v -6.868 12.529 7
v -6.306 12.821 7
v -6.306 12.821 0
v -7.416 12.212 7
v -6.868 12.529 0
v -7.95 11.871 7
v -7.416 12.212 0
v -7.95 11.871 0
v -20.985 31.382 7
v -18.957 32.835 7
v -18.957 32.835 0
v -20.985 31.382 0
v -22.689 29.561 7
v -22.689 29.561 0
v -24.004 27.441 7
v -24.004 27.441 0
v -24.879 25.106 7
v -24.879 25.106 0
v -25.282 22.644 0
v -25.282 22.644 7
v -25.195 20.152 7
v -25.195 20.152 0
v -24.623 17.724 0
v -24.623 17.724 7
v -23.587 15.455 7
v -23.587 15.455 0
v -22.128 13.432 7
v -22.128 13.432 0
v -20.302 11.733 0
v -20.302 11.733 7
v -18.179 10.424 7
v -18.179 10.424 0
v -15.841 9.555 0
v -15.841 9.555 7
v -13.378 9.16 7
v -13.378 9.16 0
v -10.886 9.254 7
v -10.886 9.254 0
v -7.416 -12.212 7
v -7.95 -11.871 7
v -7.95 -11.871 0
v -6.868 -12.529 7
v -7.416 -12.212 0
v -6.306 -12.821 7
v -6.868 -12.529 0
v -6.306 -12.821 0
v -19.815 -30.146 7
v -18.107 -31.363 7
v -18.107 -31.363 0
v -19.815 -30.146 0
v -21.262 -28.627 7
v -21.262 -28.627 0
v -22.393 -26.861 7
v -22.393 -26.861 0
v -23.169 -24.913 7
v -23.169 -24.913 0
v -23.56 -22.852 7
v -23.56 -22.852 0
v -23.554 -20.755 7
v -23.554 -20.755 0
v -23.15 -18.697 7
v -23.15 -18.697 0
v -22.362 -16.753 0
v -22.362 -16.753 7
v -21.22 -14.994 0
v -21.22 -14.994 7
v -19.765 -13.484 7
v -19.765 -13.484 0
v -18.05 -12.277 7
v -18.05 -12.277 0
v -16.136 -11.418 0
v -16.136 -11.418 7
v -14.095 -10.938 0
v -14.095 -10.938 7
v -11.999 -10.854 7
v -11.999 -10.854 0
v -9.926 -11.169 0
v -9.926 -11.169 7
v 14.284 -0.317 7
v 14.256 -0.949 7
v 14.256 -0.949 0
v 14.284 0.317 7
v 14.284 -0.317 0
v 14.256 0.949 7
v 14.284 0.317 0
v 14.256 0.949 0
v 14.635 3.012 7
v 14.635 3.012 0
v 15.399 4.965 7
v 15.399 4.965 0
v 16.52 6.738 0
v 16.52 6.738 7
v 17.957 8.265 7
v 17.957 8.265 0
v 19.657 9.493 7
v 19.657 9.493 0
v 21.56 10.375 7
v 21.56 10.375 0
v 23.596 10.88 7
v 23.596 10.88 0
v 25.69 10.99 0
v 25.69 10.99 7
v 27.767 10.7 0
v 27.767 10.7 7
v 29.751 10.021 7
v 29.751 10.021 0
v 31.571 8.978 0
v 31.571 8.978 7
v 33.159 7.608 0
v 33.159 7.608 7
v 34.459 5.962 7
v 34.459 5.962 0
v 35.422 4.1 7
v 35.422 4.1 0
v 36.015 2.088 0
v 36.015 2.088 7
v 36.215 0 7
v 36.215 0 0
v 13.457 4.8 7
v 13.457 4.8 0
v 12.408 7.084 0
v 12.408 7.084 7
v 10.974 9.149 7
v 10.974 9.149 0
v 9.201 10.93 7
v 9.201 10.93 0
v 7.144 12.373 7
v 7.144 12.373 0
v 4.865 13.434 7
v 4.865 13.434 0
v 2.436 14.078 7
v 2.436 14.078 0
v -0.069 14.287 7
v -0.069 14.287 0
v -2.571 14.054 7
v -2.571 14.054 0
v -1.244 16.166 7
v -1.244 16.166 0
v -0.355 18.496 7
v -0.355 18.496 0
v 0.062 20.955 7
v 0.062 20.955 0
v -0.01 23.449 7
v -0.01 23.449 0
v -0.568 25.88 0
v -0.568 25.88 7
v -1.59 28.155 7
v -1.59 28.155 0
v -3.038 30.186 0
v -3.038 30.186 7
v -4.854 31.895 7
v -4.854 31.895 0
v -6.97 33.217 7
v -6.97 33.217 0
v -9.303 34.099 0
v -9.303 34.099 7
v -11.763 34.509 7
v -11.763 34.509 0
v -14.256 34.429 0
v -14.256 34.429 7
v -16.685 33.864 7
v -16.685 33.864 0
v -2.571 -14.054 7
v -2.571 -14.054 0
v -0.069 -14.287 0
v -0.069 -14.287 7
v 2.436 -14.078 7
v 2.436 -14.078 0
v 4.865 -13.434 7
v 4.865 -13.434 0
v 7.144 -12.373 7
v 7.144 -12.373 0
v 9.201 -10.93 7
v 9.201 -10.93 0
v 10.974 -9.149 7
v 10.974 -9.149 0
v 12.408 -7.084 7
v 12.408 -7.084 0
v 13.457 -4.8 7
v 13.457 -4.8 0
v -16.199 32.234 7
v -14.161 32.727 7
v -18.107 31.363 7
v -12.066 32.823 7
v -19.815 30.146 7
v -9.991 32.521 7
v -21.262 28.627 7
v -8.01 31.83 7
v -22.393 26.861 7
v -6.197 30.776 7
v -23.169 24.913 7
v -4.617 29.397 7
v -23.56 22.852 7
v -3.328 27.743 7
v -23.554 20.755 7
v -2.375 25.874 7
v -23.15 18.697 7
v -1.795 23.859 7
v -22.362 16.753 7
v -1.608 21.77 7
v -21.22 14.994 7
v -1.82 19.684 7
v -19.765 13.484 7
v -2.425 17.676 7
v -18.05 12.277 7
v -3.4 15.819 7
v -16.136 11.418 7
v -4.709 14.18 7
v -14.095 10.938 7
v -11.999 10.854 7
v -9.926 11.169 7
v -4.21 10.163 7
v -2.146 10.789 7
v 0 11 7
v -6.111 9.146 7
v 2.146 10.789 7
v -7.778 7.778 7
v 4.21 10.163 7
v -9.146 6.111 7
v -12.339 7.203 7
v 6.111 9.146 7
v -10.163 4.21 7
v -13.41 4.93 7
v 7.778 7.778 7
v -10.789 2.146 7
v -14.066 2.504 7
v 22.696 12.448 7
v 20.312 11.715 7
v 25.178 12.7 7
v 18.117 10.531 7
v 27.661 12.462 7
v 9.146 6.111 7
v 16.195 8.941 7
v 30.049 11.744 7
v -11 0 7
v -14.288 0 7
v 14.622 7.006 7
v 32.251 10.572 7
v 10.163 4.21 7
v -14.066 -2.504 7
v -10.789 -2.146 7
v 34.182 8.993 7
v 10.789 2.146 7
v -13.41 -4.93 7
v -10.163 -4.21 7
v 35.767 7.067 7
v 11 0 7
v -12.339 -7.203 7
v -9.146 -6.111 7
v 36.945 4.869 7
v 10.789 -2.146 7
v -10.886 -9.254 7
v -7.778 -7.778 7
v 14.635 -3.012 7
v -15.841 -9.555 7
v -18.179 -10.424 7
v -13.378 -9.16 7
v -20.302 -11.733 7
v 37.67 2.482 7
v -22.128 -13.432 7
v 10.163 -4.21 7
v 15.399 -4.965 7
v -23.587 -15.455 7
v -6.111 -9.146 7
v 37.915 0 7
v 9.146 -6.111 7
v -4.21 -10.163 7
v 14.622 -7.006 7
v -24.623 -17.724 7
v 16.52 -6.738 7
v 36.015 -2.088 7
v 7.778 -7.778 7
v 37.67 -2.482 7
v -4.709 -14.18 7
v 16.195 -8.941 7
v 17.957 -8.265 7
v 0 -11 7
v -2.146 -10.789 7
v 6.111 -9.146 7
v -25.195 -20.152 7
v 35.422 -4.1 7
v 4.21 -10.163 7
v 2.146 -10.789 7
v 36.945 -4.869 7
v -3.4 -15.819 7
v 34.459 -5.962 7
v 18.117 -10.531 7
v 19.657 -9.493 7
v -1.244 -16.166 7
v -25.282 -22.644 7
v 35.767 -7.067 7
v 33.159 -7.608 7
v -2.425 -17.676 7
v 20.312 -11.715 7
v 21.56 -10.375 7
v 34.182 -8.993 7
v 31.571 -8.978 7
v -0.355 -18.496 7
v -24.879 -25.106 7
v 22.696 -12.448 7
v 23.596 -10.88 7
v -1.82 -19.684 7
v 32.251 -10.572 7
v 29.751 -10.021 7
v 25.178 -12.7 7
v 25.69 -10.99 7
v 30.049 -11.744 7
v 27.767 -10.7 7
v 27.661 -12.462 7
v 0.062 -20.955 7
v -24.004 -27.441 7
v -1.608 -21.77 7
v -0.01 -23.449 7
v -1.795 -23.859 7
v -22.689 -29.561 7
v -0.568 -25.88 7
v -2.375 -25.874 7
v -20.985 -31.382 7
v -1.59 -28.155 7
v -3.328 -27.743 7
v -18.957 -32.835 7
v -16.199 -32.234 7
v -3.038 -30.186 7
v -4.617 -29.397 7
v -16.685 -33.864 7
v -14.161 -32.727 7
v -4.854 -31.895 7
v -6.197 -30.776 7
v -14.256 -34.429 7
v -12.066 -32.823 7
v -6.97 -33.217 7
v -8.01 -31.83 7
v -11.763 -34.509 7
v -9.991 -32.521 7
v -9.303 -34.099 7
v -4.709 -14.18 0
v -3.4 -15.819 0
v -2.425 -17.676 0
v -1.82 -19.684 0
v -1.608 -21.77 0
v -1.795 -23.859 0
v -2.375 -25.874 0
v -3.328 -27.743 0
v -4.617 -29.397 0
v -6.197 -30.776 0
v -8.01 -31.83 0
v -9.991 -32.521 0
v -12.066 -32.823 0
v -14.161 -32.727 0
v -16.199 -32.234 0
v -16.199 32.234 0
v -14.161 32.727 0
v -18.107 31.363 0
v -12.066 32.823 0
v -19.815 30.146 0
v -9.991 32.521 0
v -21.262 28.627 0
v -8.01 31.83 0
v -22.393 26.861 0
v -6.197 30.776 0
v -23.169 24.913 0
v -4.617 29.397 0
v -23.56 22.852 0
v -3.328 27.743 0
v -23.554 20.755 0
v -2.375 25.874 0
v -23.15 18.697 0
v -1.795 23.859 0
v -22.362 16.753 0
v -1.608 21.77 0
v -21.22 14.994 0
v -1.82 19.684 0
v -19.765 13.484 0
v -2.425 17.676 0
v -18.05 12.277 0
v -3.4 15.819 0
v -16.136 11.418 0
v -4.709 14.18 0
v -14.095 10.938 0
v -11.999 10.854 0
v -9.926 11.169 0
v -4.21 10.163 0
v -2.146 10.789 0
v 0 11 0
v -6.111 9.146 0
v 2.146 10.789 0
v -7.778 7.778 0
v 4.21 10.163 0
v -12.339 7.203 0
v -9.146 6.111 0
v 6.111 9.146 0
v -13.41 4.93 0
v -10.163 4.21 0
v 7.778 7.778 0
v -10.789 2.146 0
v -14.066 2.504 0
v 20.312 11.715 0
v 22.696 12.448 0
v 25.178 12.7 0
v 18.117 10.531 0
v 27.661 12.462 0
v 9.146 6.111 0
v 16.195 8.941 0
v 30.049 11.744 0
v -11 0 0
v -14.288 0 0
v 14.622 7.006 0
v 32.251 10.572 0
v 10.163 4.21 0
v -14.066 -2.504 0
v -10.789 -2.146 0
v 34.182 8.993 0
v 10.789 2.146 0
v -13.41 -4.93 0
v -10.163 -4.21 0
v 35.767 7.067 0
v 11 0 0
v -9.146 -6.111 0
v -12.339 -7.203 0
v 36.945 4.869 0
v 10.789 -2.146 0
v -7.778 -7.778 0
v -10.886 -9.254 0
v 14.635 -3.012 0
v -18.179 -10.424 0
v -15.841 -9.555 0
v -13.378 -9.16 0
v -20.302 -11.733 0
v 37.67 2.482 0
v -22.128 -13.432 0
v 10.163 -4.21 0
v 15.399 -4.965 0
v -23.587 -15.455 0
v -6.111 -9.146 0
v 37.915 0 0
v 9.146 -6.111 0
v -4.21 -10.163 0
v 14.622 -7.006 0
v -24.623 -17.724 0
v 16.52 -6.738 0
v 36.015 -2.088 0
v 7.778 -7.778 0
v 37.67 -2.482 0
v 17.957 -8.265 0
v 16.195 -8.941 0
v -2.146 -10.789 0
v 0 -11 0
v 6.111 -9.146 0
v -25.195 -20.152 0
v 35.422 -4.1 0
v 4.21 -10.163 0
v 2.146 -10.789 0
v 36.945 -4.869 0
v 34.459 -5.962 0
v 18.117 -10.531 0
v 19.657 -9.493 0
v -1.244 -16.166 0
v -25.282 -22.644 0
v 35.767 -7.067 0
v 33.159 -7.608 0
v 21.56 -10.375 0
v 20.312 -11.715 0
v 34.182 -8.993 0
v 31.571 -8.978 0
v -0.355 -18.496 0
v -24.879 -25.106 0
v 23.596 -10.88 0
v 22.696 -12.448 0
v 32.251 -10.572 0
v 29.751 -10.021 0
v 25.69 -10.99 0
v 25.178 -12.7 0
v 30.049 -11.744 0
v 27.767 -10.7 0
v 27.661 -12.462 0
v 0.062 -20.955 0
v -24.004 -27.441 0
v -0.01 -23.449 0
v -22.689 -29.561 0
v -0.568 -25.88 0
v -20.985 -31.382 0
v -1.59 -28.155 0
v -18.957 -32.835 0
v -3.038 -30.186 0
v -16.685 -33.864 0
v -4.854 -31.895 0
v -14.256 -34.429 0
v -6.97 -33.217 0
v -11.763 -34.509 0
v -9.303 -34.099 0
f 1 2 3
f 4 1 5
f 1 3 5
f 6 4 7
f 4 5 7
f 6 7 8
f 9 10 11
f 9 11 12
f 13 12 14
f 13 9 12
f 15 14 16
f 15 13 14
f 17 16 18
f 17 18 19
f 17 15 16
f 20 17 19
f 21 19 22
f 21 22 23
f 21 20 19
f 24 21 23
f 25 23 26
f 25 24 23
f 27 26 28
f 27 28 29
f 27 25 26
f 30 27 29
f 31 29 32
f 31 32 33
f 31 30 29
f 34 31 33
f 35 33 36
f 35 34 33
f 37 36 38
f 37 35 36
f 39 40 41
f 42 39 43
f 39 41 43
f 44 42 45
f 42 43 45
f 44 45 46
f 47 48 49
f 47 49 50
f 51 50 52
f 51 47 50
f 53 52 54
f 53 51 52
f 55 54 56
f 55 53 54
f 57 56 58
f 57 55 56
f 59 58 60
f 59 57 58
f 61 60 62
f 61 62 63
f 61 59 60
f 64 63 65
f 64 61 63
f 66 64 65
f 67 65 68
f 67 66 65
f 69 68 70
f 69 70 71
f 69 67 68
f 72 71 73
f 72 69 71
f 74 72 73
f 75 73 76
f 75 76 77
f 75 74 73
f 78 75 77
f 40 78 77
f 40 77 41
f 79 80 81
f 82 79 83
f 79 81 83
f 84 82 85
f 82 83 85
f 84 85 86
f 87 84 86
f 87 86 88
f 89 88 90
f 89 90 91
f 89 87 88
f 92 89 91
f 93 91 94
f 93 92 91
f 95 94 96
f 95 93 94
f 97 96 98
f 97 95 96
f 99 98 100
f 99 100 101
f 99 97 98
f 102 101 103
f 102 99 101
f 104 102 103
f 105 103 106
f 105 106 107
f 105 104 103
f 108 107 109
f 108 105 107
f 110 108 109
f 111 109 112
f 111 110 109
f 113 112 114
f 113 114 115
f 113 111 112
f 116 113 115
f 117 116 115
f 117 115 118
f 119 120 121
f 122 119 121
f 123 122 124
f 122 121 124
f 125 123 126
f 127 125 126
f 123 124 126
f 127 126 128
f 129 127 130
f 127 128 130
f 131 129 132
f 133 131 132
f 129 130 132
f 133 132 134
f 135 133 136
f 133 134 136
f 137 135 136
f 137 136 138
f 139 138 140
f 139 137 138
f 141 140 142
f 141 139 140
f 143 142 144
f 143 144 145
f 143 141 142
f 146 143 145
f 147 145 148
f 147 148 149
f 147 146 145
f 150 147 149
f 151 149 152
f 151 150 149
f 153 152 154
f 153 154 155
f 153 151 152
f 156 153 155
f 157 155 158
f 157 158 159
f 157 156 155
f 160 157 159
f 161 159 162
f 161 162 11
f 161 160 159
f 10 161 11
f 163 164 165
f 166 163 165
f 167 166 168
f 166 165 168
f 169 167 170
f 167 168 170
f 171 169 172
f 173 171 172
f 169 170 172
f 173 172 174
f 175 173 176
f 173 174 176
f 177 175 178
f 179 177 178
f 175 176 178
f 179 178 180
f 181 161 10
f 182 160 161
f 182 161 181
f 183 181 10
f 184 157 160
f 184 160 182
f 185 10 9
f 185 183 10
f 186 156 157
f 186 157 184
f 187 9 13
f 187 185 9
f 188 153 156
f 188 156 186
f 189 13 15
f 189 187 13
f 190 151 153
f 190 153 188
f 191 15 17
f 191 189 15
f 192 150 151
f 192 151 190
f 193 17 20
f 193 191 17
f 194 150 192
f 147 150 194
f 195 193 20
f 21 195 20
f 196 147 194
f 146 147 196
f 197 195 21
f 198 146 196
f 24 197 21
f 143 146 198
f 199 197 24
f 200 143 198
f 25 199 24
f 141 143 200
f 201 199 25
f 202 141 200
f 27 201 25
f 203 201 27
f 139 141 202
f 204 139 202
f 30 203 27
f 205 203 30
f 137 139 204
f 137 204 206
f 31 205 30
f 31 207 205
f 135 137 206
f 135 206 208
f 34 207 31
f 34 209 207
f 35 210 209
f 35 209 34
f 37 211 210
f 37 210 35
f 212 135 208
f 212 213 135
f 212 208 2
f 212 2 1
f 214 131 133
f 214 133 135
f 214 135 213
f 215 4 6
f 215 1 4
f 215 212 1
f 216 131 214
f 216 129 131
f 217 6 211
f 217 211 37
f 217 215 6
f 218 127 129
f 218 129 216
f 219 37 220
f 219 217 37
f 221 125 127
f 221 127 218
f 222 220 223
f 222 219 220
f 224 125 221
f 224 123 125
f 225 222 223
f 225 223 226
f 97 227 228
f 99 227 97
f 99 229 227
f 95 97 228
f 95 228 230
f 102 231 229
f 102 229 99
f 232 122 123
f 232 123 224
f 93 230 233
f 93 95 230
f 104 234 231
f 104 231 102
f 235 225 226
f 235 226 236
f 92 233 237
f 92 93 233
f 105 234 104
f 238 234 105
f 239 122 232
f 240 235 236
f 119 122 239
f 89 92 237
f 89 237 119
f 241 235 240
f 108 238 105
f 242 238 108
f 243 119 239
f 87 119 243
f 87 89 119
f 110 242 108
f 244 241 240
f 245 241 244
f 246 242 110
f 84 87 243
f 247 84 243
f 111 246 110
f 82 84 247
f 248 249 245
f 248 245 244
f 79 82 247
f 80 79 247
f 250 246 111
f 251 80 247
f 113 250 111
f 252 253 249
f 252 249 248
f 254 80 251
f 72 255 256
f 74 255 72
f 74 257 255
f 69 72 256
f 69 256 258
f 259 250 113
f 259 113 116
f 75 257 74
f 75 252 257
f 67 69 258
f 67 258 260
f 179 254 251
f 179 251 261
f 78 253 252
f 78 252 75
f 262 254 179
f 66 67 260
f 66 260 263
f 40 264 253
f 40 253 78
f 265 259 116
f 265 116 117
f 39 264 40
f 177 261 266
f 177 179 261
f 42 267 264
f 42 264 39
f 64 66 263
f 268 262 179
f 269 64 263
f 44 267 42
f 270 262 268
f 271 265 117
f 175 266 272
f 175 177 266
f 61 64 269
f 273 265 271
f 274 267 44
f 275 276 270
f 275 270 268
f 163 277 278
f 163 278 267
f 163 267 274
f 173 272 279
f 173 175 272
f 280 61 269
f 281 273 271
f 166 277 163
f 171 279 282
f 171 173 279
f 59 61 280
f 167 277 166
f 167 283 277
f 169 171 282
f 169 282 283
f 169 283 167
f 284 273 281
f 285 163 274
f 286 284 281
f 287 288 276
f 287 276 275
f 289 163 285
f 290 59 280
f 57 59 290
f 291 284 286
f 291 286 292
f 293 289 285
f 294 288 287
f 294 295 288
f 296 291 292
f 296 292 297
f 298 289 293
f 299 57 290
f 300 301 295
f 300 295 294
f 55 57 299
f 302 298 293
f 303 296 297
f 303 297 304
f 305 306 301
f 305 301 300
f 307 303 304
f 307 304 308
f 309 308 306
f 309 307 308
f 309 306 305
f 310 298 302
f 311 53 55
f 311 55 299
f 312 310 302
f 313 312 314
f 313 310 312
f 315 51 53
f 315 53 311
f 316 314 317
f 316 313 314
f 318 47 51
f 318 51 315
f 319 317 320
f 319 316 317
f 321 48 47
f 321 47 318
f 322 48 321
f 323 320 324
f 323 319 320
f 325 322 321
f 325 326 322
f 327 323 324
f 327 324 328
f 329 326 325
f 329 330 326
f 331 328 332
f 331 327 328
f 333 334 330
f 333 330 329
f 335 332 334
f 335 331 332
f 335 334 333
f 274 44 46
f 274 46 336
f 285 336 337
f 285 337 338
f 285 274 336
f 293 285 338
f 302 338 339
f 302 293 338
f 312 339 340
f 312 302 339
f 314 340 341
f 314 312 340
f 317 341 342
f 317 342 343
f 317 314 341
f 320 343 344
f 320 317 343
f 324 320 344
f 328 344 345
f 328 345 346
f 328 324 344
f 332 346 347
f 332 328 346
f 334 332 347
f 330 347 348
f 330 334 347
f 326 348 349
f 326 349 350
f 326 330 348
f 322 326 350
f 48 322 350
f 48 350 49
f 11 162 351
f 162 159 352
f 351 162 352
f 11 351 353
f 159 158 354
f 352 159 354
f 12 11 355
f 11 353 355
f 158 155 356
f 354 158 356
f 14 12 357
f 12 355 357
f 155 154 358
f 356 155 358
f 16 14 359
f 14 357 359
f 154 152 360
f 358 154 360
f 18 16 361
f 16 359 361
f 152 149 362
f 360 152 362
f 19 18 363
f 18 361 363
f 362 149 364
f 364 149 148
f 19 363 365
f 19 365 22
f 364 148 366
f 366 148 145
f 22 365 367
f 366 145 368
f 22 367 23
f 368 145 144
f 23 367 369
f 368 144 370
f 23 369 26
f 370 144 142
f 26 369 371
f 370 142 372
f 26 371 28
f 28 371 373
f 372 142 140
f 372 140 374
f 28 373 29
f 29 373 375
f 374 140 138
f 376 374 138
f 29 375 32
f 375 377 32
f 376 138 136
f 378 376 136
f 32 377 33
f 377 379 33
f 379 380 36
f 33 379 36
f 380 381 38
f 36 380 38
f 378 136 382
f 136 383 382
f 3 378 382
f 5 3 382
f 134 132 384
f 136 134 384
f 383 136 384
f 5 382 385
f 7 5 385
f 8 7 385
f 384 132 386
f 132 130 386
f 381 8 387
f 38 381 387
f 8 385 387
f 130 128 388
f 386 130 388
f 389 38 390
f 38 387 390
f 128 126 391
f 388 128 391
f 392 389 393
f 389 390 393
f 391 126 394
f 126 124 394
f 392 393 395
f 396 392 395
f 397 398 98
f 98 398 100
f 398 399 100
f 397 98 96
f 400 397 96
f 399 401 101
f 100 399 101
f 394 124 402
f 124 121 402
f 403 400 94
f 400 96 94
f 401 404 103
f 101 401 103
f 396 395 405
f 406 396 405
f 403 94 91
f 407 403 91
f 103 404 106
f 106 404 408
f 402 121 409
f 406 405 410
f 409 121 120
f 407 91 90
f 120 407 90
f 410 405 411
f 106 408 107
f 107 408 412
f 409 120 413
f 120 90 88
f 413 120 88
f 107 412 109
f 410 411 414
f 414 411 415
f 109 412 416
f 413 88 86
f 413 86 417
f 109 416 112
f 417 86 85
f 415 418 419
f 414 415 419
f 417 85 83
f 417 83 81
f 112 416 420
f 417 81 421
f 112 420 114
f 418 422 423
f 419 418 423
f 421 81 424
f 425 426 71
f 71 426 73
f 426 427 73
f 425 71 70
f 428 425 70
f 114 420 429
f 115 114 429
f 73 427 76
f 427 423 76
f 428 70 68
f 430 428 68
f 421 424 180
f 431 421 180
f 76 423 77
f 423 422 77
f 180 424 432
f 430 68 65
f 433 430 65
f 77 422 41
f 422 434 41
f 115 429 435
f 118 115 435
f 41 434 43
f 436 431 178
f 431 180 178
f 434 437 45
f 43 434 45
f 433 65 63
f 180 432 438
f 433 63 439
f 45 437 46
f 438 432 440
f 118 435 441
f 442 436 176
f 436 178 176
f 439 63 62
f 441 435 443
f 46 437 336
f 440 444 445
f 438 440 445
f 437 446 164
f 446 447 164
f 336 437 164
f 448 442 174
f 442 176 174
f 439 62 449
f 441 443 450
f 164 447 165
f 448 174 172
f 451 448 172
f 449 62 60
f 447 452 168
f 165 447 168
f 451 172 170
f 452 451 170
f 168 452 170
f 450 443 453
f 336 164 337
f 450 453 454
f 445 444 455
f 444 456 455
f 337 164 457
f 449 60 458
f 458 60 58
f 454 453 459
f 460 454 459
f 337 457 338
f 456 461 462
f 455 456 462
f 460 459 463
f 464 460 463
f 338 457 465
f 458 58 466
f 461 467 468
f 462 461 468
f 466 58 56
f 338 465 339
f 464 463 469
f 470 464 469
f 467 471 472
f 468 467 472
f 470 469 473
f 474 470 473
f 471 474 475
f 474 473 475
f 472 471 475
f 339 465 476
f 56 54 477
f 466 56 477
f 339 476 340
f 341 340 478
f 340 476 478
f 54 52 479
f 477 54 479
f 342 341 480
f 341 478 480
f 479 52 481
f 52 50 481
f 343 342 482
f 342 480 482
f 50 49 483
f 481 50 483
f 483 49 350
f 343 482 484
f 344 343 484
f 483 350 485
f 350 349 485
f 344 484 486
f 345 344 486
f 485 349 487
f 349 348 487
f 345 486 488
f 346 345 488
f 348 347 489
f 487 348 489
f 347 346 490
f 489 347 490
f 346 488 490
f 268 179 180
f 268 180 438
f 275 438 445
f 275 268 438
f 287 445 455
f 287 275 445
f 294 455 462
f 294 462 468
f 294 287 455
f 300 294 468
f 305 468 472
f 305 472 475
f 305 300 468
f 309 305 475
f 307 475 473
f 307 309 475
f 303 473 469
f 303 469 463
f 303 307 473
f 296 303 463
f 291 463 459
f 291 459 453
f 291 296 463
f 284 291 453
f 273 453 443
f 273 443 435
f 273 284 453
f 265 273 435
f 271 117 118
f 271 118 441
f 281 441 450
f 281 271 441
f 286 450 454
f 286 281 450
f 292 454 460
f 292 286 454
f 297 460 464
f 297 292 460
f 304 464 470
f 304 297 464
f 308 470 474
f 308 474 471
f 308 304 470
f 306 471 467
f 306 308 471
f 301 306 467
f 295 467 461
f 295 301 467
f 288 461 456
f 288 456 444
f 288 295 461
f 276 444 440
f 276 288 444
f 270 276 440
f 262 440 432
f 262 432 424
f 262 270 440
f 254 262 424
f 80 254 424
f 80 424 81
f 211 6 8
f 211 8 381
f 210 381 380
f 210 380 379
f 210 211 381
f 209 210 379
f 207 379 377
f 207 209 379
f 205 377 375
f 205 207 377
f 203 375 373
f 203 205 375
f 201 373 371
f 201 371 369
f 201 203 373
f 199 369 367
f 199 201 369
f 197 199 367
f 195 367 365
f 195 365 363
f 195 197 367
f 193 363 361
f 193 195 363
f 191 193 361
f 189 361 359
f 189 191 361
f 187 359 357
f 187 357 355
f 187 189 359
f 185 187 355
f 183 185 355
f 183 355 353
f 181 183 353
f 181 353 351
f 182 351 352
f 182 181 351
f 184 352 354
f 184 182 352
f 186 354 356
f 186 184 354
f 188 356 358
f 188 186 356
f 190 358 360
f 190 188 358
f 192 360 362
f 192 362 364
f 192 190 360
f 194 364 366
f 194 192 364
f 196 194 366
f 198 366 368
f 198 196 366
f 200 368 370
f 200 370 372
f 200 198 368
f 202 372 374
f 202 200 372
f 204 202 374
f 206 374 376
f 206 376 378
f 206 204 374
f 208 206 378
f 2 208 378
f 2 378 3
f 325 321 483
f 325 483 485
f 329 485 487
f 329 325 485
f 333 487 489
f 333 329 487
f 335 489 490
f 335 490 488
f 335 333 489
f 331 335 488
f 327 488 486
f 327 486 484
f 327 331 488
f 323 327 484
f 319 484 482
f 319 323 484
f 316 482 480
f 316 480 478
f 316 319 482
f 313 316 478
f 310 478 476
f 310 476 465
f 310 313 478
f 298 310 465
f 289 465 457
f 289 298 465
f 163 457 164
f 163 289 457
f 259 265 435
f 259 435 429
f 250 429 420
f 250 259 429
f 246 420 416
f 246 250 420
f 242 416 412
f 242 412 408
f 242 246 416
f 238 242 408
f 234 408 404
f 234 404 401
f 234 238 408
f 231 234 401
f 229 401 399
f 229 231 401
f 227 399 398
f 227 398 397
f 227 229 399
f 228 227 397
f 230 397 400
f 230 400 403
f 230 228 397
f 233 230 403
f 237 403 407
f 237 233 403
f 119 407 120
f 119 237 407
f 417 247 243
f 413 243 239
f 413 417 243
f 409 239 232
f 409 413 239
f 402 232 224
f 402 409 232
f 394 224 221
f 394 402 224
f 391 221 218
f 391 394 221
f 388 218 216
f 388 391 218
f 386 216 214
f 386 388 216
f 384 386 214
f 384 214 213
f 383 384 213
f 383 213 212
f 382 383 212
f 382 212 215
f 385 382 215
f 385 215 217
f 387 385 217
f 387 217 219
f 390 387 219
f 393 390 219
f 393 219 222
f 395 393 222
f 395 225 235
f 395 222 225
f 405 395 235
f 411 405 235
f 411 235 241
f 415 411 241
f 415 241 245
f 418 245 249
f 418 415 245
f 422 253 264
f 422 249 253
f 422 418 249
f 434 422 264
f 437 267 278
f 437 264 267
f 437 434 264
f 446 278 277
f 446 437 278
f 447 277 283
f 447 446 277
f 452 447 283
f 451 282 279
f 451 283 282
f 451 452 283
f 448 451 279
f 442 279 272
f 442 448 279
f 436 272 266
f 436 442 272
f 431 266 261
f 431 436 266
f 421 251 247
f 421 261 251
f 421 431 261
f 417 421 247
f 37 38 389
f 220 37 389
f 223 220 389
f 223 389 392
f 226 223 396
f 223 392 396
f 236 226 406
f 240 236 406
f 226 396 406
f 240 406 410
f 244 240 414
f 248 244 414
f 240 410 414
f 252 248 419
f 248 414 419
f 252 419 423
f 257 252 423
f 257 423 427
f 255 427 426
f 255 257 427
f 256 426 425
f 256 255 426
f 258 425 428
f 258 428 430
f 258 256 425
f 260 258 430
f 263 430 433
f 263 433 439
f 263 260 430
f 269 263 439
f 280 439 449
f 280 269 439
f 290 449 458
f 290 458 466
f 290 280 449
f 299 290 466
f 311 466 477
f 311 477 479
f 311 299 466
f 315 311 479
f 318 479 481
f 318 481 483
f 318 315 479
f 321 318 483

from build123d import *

# Parameters (mm, degrees)
F0_R     = 14.2875
F0_R_2   = 11
F1_DEPTH = 7
F3_DEPTH = 7
F4_COUNT = 3


with BuildPart() as f1:
    # F0 (on Top) → F1 (new body)
    with BuildSketch(Plane.XY):
        Circle(F0_R)
        Circle(F0_R_2, mode=Mode.SUBTRACT)
    extrude(amount=F1_DEPTH)

    # F2 (on face) → F3 (join)
    with BuildSketch(Plane.XY.offset(7)):
        with BuildLine():
            ThreePointArc((14.255938, 0.949145), (25.689929, 10.989739), (36.214913, 0))
            ThreePointArc((36.214913, 0), (25.689929, -10.989739), (14.255938, -0.949145))
            ThreePointArc((14.255938, -0.949145), (13.989619, -2.90228), (13.457006, -4.80017))
            ThreePointArc((13.457006, -4.80017), (27.660786, -12.462251), (37.914913, 0))
            ThreePointArc((37.914913, 0), (27.660786, 12.462251), (13.457006, 4.80017))
            ThreePointArc((13.457006, 4.80017), (13.989619, 2.90228), (14.255938, 0.949145))
        make_face()
    extrude(amount=-F3_DEPTH)

    # F4: F1 ×3 about axis
    f4_axis = Axis((0, 0, 7), (0, 0, 1))


with BuildPart() as f1_1:
    add(f1.part)
    for i in range(1, F4_COUNT):
        add(f1.part.rotate(f4_axis, i * 360 / F4_COUNT))


solid = f1_1.part
